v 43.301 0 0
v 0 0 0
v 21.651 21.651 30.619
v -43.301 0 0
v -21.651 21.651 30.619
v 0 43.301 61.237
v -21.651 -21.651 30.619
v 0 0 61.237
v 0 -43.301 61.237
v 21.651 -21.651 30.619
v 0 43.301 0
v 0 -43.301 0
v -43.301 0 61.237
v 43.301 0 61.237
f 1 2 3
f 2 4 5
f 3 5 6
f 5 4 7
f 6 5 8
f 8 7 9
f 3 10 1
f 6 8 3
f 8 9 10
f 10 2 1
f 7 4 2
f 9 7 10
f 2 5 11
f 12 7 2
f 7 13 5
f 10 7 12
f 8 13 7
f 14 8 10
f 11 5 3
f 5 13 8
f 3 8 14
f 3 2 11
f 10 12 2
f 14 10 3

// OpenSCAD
size = 1;

scale(sqrt(3) * 25) union() {
    tetra();
    rotate(90) tetra();
};

module tetra() {
    polyhedron(
        points = [
            [ 1, 0, 0],
            [-1, 0, 0],
            [0,  1, sqrt(2)],
            [0, -1, sqrt(2)]],
        faces=[
            [0, 1, 2],
            [2, 1, 3],
            [2, 3, 0],
            [3, 1, 0]]);
}
